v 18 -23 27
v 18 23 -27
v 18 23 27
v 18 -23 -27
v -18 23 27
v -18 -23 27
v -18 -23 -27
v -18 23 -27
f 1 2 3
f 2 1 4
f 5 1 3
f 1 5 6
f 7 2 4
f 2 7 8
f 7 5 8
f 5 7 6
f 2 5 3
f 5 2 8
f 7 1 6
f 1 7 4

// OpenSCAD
// ============================================================================
// Atom Lithography Machine — Parametric OpenSCAD Module (S6.3-04)
// ============================================================================
// part_id           : S6.3-04
// parent_bom_id     : S6.3
// subsystem         : S6
// part_name         : Kalici-mod (persistent) superiletken anahtar ve quench koruma devresi
// material          : OFHC Cu
// temp_stage        : 4.2 K / 300 K
// vacuum_grade      : Kriyo-vakum
// tolerance         : <0.1 ppm/h
// computed_mass_kg  : 0.40521
// envelope_mm       : 36.000 x 46.000 x 53.900
// design_maturity   : M0_M1_DETAILED_CAD_DESIGN_ONLY
// no_lab_measurement: true
// iec61508_certified: false
// semi_s2_certified : false
// Units: millimeters (mm)
// ============================================================================

$fn = 64;

// Nominal bounding envelope parameters (mm)
bbox_x = 36.0000;
bbox_y = 46.0000;
bbox_z = 53.9000;

// Part-specific parametric dimensions
n_switches = 4;
r_dump_ohm = 1.563;
e_mag_kj = 18.9;
t_quench_peak_k = 64.6;

// Interface / port parameters (mm)
port_base_4k_mount_bolts = 4;

module part_S6_3_04() {
  union() {
    // 4.2 K 4-channel persistent switch & cold-diode quench box
    cube([36.000, 46.000, 54.000], center=true);
    // NbTi persistent switch ch1
    translate([-6.500, -10.500, 0.000]) cylinder(d=10.000, h=32.000, center=true);
  }
}

// World assembly mounting transform (global machine frame, mm / deg):
// translate([-598.000, 0.000, 792.500]) rotate([0.000, 0.000, 0.000]) part_S6_3_04();

part_S6_3_04();
